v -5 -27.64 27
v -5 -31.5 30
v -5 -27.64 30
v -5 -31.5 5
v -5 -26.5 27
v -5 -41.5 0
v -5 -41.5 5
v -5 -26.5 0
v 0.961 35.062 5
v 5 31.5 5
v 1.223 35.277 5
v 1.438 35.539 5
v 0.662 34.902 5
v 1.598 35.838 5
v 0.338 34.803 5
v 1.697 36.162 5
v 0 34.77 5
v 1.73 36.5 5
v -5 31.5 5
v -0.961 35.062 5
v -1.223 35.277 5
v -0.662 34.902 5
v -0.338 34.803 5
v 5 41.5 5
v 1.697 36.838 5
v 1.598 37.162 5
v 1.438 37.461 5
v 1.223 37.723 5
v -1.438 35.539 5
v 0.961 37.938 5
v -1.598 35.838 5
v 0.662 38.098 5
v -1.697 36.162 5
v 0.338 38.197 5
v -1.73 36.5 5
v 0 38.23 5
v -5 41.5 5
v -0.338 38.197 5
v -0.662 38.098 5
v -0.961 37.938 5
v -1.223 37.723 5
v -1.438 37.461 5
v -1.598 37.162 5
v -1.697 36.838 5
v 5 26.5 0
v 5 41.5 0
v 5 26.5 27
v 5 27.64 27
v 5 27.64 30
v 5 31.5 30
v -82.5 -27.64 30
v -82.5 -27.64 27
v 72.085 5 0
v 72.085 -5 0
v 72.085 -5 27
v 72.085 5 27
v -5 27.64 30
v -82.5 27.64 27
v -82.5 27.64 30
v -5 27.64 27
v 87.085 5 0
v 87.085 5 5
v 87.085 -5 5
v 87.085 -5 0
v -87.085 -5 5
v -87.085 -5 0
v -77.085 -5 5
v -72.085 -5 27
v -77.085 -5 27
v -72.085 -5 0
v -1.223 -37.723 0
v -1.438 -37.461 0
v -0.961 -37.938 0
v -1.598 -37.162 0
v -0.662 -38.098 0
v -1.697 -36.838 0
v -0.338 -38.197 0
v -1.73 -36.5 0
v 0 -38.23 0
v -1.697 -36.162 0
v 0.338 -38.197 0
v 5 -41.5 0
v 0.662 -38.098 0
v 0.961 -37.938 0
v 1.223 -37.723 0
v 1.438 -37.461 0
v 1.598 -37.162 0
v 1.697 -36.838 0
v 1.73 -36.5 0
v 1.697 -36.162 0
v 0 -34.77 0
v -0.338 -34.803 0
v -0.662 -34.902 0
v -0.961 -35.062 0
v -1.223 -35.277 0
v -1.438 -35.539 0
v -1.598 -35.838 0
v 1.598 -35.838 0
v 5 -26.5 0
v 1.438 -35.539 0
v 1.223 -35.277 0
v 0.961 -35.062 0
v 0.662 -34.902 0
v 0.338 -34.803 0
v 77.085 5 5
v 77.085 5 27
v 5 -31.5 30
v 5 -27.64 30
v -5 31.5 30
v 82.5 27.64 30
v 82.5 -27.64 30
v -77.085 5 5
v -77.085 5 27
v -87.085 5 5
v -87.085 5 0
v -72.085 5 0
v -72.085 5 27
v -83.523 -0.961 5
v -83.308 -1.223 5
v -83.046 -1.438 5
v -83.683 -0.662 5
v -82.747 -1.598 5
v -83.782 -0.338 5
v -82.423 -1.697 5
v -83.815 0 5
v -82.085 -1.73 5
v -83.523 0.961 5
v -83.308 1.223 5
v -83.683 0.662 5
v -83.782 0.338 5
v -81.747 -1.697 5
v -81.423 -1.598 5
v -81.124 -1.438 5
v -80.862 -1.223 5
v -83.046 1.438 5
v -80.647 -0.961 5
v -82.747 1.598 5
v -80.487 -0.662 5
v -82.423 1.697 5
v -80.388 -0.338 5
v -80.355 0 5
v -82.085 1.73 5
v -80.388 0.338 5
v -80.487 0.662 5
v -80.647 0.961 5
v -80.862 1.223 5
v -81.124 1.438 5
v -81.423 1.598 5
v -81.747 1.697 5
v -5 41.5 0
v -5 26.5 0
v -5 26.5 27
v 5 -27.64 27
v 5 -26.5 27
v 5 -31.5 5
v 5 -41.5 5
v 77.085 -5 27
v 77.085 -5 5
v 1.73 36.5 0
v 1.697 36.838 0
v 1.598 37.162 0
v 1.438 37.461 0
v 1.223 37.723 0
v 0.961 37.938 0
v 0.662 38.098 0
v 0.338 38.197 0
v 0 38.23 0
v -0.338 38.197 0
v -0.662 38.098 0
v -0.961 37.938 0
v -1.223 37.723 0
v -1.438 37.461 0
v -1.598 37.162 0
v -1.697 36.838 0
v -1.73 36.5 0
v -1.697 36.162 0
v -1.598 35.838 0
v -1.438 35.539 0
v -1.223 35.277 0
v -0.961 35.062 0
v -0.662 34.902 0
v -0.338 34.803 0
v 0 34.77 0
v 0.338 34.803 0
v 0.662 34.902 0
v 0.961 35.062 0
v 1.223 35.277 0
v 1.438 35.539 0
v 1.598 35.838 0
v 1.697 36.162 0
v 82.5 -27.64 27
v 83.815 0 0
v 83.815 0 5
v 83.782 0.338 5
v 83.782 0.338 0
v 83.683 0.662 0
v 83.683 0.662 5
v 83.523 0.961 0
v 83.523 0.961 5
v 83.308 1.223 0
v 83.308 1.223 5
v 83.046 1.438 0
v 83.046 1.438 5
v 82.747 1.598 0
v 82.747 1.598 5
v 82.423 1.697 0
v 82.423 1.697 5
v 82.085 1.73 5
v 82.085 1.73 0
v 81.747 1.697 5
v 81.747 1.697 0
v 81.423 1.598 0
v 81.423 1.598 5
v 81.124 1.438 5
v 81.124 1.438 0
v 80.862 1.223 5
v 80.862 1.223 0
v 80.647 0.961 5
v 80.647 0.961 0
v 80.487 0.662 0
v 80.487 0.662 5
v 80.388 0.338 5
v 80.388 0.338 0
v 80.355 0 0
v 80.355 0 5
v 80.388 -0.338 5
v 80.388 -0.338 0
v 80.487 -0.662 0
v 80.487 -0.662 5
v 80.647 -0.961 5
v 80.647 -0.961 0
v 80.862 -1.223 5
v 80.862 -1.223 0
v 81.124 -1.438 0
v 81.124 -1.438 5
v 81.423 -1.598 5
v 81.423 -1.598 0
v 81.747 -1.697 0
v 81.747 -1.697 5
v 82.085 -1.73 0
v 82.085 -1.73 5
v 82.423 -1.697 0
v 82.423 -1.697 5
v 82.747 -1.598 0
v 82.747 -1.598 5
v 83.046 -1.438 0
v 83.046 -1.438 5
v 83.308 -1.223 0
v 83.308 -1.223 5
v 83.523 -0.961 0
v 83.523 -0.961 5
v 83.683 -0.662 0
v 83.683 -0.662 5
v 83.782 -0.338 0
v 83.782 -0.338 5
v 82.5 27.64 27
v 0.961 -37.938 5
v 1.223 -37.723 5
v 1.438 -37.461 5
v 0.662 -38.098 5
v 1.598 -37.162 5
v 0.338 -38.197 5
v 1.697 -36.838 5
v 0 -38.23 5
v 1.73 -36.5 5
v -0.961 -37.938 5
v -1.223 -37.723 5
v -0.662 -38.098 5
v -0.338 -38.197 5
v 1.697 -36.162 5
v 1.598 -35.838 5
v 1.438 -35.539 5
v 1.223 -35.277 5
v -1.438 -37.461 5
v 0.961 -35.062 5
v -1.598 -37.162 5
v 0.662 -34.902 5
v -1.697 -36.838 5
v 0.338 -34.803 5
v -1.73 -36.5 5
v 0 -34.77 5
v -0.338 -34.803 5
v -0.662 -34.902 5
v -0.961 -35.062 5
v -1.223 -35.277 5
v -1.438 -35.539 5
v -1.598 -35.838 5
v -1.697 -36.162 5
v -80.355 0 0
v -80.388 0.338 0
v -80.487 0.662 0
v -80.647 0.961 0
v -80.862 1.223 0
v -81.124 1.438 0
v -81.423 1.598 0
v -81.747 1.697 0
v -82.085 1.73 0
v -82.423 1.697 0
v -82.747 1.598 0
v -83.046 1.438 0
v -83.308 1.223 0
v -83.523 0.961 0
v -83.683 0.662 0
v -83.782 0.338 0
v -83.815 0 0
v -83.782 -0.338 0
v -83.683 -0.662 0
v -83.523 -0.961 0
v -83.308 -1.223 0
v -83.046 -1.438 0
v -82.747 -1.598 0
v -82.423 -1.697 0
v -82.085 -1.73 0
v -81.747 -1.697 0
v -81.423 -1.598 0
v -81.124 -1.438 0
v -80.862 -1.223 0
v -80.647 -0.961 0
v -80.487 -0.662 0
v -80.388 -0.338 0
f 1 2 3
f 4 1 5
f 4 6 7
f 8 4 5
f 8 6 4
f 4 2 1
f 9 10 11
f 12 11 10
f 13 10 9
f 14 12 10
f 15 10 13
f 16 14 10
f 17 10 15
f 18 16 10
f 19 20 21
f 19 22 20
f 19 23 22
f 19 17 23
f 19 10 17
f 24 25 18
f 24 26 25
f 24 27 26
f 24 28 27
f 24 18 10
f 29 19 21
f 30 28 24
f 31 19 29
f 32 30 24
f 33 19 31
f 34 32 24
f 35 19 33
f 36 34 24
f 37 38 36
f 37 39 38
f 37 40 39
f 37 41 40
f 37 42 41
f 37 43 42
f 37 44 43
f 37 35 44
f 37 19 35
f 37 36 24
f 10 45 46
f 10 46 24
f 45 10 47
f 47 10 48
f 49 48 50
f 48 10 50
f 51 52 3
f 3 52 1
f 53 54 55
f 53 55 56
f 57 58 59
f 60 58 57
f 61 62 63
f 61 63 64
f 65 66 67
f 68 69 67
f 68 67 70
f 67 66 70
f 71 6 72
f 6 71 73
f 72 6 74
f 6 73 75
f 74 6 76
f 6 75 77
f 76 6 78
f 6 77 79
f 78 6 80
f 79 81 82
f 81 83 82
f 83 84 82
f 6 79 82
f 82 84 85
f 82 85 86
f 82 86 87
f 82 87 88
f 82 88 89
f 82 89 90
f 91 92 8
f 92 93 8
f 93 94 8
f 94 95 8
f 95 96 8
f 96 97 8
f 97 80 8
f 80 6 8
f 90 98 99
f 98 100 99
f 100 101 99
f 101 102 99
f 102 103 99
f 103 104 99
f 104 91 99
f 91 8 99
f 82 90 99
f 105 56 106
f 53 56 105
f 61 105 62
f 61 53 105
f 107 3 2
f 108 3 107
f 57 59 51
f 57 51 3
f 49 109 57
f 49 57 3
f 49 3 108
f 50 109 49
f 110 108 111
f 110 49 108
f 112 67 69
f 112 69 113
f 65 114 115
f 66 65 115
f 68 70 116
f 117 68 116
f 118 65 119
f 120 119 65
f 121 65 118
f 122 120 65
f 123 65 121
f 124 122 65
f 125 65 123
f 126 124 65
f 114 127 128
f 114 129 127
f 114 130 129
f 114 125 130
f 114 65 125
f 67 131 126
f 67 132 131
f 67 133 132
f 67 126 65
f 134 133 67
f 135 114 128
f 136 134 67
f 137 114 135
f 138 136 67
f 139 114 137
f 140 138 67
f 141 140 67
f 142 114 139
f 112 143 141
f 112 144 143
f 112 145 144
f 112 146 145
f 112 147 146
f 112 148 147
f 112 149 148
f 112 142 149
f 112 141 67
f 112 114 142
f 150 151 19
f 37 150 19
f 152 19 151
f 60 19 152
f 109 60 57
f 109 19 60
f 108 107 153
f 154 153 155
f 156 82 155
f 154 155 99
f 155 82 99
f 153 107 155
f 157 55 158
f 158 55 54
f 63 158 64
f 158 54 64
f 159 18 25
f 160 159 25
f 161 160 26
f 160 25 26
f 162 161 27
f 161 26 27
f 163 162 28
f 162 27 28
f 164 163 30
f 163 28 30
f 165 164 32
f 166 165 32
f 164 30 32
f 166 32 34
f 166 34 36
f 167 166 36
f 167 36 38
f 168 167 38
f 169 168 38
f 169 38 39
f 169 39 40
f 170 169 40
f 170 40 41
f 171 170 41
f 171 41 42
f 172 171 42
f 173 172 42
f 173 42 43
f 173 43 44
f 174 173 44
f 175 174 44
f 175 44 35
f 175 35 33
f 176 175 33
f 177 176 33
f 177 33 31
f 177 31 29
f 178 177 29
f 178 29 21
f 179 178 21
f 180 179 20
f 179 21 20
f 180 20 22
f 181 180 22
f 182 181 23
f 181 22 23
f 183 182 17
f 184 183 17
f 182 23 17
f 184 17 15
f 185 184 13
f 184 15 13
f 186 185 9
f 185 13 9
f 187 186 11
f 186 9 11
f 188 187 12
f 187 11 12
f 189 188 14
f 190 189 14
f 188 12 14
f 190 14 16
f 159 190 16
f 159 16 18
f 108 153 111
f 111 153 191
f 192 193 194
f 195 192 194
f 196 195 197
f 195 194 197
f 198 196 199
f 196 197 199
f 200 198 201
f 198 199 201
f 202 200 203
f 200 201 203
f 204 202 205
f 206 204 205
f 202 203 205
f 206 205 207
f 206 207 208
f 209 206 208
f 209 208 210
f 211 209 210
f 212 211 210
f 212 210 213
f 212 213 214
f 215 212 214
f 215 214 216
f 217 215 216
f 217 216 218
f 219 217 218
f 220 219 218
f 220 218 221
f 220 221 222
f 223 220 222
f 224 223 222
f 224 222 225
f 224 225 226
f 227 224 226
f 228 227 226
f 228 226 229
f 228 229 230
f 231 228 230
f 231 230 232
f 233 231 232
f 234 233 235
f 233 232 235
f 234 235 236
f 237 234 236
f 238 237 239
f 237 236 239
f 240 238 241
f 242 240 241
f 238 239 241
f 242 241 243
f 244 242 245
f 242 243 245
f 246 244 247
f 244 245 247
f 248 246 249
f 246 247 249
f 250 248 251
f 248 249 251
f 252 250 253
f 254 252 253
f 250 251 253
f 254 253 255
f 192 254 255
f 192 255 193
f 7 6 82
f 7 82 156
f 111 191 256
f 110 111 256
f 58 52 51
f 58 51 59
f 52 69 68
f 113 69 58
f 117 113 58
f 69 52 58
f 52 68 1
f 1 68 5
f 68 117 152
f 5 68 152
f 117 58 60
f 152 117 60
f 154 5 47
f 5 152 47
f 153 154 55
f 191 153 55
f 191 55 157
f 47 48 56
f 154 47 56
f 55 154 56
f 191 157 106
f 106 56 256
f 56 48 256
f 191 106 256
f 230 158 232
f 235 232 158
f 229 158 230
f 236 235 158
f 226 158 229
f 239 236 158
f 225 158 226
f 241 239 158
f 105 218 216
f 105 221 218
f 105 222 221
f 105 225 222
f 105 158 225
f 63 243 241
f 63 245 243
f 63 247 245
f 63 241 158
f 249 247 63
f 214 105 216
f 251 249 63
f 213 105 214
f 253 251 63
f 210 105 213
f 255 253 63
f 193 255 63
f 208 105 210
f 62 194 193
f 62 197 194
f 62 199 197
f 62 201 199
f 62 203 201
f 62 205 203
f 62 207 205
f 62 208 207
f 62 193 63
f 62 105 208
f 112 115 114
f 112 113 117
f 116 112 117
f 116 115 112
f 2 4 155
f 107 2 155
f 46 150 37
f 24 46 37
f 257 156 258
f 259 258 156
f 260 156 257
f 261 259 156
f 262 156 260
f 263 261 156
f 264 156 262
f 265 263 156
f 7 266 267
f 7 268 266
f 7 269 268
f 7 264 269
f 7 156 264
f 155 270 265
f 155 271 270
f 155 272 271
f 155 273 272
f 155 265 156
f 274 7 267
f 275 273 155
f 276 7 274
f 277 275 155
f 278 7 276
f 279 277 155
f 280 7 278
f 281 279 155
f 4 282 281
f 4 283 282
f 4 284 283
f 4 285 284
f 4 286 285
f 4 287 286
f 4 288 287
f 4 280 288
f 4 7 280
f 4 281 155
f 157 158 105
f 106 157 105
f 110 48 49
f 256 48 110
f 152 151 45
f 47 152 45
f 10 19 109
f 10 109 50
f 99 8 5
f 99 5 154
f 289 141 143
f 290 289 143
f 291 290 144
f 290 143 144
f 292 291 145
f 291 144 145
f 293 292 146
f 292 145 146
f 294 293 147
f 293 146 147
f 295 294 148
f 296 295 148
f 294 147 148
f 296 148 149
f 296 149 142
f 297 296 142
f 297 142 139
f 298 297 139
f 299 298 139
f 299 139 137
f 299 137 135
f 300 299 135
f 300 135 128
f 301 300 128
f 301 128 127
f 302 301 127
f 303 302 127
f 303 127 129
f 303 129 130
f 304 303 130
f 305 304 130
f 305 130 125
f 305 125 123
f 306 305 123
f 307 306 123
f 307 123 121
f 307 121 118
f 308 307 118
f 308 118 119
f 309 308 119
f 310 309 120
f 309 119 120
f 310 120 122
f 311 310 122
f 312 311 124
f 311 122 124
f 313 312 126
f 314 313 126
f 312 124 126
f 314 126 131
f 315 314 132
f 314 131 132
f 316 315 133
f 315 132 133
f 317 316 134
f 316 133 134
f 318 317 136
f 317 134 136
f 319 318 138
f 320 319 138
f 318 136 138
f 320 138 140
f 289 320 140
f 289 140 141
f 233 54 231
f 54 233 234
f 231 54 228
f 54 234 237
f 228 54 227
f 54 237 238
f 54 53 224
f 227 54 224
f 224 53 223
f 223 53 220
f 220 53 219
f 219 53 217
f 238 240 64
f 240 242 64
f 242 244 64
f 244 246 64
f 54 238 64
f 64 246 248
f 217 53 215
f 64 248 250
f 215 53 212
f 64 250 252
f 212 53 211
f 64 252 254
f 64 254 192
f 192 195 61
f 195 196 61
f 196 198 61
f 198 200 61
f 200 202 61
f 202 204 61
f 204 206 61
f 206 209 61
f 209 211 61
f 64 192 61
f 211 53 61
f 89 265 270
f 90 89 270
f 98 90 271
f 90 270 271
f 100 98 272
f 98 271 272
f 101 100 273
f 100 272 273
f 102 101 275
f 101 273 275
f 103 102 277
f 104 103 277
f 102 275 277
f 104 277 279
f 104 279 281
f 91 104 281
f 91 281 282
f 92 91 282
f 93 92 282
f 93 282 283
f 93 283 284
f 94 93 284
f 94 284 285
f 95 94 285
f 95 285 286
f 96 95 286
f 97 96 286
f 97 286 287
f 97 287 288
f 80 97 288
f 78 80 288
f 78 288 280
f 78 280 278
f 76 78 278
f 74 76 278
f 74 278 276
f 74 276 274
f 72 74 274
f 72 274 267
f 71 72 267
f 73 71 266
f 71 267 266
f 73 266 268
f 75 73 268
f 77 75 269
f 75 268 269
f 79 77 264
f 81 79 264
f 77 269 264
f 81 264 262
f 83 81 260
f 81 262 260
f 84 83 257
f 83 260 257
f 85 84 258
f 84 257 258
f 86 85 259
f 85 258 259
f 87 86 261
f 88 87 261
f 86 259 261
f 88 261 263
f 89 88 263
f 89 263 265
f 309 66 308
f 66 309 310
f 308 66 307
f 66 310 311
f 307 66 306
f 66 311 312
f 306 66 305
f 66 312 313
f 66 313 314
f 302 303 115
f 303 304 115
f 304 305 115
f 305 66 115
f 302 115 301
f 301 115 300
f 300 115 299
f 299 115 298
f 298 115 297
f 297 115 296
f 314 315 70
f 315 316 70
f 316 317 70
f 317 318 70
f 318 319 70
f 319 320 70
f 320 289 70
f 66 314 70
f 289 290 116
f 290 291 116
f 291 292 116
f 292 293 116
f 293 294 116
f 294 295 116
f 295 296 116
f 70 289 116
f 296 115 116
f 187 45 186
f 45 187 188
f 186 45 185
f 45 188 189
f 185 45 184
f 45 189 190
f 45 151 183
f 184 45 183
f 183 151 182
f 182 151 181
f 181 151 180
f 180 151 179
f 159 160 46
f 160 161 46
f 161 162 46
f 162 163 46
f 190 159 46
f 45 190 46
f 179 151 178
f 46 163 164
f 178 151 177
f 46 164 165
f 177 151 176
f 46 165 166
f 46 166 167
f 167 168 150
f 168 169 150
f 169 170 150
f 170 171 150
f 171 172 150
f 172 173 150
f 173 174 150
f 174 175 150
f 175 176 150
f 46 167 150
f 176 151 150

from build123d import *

# Parameters (mm, degrees)
SKETCH2_W             = 5
SKETCH2_H             = 10
BOSS_EXTRUDE1_DEPTH   = 27
SKETCH2_W_2           = 10
SKETCH2_H_2           = 5
BOSS_EXTRUDE1_2_DEPTH = 27
BOSS_EXTRUDE1_3_DEPTH = 27
BOSS_EXTRUDE1_4_DEPTH = 27
SKETCH3_W             = 165
SKETCH3_H             = 55.28
BOSS_EXTRUDE2_DEPTH   = 3
SKETCH4_W             = 10
SKETCH4_H             = 3.86
BOSS_EXTRUDE3_DEPTH   = 3
SKETCH5_W             = 10
SKETCH5_H             = 5
BOSS_EXTRUDE4_DEPTH   = 10
SKETCH7_W             = 5
SKETCH7_H             = 10
BOSS_EXTRUDE5_DEPTH   = 10
SKETCH8_R             = 1.73
CUT_EXTRUDE1_DEPTH    = 6


with BuildPart() as part:
    # Sketch2 → Boss-Extrude1 (new body)
    with BuildSketch(Plane.XY):
        with Locations((-74.585, 0)):
            Rectangle(SKETCH2_W, SKETCH2_H)
    extrude(amount=BOSS_EXTRUDE1_DEPTH)



with BuildPart() as body_2:
    # Sketch2 → Boss-Extrude1 2 (new body)
    with BuildSketch(Plane.XY):
        with Locations((0, 29)):
            Rectangle(SKETCH2_W_2, SKETCH2_H_2)
    extrude(amount=BOSS_EXTRUDE1_2_DEPTH)


with BuildPart() as body_3:
    # Sketch2 → Boss-Extrude1 3 (new body)
    with BuildSketch(Plane.XY):
        with Locations((74.585, 0)):
            Rectangle(SKETCH2_W, SKETCH2_H)
    extrude(amount=BOSS_EXTRUDE1_3_DEPTH)


with BuildPart() as body_4:
    # Sketch2 → Boss-Extrude1 4 (new body)
    with BuildSketch(Plane.XY):
        with Locations((0, -29)):
            Rectangle(SKETCH2_W_2, SKETCH2_H_2)
    extrude(amount=BOSS_EXTRUDE1_4_DEPTH)


with BuildPart() as part_1:
    add(part.part)

    add(body_2.part)  # Boss-Extrude2 merges body 2

    add(body_3.part)  # Boss-Extrude2 merges body 3

    add(body_4.part)  # Boss-Extrude2 merges body 4
    # Sketch3 → Boss-Extrude2 (add)
    with BuildSketch(Plane.XY.offset(27)):
        Rectangle(SKETCH3_W, SKETCH3_H)
    extrude(amount=BOSS_EXTRUDE2_DEPTH)

    # Sketch4 → Boss-Extrude3 (add)
    with BuildSketch(Plane.XY.offset(27)):
        with Locations((0, 29.57)):
            Rectangle(SKETCH4_W, SKETCH4_H)
        with Locations((0, -29.57)):
            Rectangle(SKETCH4_W, SKETCH4_H)
    extrude(amount=BOSS_EXTRUDE3_DEPTH)

    # Sketch5 → Boss-Extrude4 (add)
    with BuildSketch(Plane(origin=(0, 5, 0), x_dir=(1, 0, 0), z_dir=(0, 1, 0))):
        with Locations((-82.085, -2.5)):
            Rectangle(SKETCH5_W, SKETCH5_H)
        with Locations((82.085, -2.5)):
            Rectangle(SKETCH5_W, SKETCH5_H)
    extrude(amount=-BOSS_EXTRUDE4_DEPTH)

    # Sketch7 → Boss-Extrude5 (add)
    with BuildSketch(Plane.ZY.offset(5)):
        with Locations((2.5, 36.5)):
            Rectangle(SKETCH7_W, SKETCH7_H)
        with Locations((2.5, -36.5)):
            Rectangle(SKETCH7_W, SKETCH7_H)
    extrude(amount=-BOSS_EXTRUDE5_DEPTH)

    # Sketch8 → Cut-Extrude1 (cut, through all)
    with BuildSketch(Plane.XY.offset(5)):
        with Locations((-82.085, 0)):
            Circle(SKETCH8_R)
        with Locations((0, -36.5)):
            Circle(SKETCH8_R)
        with Locations((82.085, 0)):
            Circle(SKETCH8_R)
        with Locations((0, 36.5)):
            Circle(SKETCH8_R)
    extrude(amount=-CUT_EXTRUDE1_DEPTH, mode=Mode.SUBTRACT)


solid = part_1.part
